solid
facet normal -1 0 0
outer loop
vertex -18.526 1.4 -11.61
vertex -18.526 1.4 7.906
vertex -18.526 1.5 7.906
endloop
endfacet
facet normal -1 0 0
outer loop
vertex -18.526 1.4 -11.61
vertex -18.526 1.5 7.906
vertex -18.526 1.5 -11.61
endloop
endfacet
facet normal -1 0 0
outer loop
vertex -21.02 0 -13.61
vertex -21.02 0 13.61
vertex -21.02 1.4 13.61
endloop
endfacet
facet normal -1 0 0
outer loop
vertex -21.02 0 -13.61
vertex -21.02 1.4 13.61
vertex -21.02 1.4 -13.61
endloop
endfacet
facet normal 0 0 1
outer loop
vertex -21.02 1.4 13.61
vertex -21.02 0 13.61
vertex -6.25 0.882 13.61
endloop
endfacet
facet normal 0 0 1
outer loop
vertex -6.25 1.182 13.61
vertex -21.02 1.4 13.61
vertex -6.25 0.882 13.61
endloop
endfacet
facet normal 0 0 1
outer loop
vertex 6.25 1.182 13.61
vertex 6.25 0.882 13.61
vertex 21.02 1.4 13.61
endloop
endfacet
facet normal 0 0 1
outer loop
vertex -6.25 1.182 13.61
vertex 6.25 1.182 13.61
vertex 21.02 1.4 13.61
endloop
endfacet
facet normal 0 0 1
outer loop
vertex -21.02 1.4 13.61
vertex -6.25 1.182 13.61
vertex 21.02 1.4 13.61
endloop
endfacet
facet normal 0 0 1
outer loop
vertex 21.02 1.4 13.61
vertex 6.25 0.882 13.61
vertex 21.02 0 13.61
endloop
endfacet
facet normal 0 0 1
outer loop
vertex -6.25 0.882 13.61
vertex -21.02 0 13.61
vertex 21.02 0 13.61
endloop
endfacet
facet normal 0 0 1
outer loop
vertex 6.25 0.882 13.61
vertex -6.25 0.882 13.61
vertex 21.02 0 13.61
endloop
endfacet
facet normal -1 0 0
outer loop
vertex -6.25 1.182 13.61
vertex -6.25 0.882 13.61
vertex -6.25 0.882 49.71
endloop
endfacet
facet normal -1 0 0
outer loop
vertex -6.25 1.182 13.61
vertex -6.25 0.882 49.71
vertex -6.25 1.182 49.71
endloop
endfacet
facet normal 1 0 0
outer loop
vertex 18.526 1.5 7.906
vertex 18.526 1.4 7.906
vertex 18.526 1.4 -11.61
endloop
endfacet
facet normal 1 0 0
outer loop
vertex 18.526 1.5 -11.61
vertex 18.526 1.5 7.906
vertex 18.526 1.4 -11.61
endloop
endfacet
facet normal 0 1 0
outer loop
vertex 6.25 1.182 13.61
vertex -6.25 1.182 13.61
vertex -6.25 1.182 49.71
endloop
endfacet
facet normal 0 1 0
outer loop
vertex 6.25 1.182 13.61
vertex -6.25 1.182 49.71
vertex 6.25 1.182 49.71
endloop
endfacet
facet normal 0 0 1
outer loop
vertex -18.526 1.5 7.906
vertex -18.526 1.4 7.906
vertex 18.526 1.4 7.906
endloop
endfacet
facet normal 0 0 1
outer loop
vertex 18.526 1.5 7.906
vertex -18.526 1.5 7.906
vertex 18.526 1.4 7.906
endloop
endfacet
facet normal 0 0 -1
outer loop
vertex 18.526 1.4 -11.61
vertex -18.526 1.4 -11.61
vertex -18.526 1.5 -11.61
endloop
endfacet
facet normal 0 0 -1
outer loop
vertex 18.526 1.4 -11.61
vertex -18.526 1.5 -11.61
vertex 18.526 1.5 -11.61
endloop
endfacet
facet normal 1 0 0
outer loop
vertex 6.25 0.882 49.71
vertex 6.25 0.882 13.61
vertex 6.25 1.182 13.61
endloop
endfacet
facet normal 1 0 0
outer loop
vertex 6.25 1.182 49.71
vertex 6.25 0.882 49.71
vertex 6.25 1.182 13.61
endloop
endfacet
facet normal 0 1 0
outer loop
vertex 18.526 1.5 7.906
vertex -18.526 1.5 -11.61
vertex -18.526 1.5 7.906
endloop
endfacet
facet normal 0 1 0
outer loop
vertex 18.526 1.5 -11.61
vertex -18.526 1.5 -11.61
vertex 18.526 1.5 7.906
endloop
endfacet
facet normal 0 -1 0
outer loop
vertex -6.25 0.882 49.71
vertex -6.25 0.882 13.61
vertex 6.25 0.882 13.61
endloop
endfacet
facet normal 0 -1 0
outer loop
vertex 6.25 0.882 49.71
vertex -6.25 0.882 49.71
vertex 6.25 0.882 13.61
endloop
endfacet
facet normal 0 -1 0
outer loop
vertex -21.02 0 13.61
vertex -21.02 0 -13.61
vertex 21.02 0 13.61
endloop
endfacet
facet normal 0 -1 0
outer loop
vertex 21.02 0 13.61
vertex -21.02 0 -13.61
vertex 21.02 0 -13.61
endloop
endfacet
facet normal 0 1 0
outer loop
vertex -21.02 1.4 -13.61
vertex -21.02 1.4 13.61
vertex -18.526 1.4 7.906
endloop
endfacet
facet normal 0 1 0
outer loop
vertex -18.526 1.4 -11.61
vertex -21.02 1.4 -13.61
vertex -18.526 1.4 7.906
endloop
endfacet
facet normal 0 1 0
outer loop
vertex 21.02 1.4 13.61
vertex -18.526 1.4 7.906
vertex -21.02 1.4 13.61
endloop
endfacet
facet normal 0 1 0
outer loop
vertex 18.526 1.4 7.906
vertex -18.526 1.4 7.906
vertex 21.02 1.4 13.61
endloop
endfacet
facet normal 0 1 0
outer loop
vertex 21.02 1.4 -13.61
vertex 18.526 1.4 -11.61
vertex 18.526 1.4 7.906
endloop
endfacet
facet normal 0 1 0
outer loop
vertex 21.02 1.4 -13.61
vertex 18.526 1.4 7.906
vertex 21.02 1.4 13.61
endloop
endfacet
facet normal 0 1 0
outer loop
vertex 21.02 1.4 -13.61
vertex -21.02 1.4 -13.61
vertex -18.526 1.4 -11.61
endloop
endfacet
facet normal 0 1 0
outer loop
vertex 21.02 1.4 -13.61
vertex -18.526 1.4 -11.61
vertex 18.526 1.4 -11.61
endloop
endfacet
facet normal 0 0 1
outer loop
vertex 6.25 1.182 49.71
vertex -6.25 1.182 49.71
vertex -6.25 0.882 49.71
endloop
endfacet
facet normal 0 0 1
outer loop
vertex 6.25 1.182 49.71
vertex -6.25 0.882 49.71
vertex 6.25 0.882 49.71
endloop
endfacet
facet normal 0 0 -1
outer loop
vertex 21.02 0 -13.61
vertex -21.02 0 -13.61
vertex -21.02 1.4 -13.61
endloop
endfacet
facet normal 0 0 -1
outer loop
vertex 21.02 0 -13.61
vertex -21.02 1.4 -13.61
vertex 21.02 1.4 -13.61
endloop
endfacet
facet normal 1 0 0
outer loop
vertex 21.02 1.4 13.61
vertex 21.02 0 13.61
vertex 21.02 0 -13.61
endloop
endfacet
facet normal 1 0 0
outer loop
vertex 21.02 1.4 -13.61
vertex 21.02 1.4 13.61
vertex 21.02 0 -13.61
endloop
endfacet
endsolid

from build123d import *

# Parameters (mm, degrees)
SKETCH_1_W      = 42.04
SKETCH_1_H      = 27.22
EXTRUDE_1_DEPTH = 1.4
SKETCH_2_W      = 37.052
SKETCH_2_H      = 19.516
EXTRUDE_2_DEPTH = 0.1
SKETCH_3_W      = 12.5
SKETCH_3_H      = 0.3
EXTRUDE_3_DEPTH = 36.1


with BuildPart() as part:
    # 草图1 → 凸台-拉伸1 (new body)
    with BuildSketch(Plane(origin=(0, 0, 0), x_dir=(1, 0, 0), z_dir=(0, 1, 0))):
        Rectangle(SKETCH_1_W, SKETCH_1_H)
    extrude(amount=EXTRUDE_1_DEPTH)

    # 草图2 → 凸台-拉伸2 (add)
    with BuildSketch(Plane(origin=(0, 1.4, 0), x_dir=(1, 0, 0), z_dir=(0, 1, 0))):
        with Locations((0, 1.852)):
            Rectangle(SKETCH_2_W, SKETCH_2_H)
    extrude(amount=EXTRUDE_2_DEPTH)

    # 草图3 → 凸台-拉伸3 (add)
    with BuildSketch(Plane.XY.offset(13.61)):
        with Locations((0, 1.031860601)):
            Rectangle(SKETCH_3_W, SKETCH_3_H)
    extrude(amount=EXTRUDE_3_DEPTH)


solid = part.part
